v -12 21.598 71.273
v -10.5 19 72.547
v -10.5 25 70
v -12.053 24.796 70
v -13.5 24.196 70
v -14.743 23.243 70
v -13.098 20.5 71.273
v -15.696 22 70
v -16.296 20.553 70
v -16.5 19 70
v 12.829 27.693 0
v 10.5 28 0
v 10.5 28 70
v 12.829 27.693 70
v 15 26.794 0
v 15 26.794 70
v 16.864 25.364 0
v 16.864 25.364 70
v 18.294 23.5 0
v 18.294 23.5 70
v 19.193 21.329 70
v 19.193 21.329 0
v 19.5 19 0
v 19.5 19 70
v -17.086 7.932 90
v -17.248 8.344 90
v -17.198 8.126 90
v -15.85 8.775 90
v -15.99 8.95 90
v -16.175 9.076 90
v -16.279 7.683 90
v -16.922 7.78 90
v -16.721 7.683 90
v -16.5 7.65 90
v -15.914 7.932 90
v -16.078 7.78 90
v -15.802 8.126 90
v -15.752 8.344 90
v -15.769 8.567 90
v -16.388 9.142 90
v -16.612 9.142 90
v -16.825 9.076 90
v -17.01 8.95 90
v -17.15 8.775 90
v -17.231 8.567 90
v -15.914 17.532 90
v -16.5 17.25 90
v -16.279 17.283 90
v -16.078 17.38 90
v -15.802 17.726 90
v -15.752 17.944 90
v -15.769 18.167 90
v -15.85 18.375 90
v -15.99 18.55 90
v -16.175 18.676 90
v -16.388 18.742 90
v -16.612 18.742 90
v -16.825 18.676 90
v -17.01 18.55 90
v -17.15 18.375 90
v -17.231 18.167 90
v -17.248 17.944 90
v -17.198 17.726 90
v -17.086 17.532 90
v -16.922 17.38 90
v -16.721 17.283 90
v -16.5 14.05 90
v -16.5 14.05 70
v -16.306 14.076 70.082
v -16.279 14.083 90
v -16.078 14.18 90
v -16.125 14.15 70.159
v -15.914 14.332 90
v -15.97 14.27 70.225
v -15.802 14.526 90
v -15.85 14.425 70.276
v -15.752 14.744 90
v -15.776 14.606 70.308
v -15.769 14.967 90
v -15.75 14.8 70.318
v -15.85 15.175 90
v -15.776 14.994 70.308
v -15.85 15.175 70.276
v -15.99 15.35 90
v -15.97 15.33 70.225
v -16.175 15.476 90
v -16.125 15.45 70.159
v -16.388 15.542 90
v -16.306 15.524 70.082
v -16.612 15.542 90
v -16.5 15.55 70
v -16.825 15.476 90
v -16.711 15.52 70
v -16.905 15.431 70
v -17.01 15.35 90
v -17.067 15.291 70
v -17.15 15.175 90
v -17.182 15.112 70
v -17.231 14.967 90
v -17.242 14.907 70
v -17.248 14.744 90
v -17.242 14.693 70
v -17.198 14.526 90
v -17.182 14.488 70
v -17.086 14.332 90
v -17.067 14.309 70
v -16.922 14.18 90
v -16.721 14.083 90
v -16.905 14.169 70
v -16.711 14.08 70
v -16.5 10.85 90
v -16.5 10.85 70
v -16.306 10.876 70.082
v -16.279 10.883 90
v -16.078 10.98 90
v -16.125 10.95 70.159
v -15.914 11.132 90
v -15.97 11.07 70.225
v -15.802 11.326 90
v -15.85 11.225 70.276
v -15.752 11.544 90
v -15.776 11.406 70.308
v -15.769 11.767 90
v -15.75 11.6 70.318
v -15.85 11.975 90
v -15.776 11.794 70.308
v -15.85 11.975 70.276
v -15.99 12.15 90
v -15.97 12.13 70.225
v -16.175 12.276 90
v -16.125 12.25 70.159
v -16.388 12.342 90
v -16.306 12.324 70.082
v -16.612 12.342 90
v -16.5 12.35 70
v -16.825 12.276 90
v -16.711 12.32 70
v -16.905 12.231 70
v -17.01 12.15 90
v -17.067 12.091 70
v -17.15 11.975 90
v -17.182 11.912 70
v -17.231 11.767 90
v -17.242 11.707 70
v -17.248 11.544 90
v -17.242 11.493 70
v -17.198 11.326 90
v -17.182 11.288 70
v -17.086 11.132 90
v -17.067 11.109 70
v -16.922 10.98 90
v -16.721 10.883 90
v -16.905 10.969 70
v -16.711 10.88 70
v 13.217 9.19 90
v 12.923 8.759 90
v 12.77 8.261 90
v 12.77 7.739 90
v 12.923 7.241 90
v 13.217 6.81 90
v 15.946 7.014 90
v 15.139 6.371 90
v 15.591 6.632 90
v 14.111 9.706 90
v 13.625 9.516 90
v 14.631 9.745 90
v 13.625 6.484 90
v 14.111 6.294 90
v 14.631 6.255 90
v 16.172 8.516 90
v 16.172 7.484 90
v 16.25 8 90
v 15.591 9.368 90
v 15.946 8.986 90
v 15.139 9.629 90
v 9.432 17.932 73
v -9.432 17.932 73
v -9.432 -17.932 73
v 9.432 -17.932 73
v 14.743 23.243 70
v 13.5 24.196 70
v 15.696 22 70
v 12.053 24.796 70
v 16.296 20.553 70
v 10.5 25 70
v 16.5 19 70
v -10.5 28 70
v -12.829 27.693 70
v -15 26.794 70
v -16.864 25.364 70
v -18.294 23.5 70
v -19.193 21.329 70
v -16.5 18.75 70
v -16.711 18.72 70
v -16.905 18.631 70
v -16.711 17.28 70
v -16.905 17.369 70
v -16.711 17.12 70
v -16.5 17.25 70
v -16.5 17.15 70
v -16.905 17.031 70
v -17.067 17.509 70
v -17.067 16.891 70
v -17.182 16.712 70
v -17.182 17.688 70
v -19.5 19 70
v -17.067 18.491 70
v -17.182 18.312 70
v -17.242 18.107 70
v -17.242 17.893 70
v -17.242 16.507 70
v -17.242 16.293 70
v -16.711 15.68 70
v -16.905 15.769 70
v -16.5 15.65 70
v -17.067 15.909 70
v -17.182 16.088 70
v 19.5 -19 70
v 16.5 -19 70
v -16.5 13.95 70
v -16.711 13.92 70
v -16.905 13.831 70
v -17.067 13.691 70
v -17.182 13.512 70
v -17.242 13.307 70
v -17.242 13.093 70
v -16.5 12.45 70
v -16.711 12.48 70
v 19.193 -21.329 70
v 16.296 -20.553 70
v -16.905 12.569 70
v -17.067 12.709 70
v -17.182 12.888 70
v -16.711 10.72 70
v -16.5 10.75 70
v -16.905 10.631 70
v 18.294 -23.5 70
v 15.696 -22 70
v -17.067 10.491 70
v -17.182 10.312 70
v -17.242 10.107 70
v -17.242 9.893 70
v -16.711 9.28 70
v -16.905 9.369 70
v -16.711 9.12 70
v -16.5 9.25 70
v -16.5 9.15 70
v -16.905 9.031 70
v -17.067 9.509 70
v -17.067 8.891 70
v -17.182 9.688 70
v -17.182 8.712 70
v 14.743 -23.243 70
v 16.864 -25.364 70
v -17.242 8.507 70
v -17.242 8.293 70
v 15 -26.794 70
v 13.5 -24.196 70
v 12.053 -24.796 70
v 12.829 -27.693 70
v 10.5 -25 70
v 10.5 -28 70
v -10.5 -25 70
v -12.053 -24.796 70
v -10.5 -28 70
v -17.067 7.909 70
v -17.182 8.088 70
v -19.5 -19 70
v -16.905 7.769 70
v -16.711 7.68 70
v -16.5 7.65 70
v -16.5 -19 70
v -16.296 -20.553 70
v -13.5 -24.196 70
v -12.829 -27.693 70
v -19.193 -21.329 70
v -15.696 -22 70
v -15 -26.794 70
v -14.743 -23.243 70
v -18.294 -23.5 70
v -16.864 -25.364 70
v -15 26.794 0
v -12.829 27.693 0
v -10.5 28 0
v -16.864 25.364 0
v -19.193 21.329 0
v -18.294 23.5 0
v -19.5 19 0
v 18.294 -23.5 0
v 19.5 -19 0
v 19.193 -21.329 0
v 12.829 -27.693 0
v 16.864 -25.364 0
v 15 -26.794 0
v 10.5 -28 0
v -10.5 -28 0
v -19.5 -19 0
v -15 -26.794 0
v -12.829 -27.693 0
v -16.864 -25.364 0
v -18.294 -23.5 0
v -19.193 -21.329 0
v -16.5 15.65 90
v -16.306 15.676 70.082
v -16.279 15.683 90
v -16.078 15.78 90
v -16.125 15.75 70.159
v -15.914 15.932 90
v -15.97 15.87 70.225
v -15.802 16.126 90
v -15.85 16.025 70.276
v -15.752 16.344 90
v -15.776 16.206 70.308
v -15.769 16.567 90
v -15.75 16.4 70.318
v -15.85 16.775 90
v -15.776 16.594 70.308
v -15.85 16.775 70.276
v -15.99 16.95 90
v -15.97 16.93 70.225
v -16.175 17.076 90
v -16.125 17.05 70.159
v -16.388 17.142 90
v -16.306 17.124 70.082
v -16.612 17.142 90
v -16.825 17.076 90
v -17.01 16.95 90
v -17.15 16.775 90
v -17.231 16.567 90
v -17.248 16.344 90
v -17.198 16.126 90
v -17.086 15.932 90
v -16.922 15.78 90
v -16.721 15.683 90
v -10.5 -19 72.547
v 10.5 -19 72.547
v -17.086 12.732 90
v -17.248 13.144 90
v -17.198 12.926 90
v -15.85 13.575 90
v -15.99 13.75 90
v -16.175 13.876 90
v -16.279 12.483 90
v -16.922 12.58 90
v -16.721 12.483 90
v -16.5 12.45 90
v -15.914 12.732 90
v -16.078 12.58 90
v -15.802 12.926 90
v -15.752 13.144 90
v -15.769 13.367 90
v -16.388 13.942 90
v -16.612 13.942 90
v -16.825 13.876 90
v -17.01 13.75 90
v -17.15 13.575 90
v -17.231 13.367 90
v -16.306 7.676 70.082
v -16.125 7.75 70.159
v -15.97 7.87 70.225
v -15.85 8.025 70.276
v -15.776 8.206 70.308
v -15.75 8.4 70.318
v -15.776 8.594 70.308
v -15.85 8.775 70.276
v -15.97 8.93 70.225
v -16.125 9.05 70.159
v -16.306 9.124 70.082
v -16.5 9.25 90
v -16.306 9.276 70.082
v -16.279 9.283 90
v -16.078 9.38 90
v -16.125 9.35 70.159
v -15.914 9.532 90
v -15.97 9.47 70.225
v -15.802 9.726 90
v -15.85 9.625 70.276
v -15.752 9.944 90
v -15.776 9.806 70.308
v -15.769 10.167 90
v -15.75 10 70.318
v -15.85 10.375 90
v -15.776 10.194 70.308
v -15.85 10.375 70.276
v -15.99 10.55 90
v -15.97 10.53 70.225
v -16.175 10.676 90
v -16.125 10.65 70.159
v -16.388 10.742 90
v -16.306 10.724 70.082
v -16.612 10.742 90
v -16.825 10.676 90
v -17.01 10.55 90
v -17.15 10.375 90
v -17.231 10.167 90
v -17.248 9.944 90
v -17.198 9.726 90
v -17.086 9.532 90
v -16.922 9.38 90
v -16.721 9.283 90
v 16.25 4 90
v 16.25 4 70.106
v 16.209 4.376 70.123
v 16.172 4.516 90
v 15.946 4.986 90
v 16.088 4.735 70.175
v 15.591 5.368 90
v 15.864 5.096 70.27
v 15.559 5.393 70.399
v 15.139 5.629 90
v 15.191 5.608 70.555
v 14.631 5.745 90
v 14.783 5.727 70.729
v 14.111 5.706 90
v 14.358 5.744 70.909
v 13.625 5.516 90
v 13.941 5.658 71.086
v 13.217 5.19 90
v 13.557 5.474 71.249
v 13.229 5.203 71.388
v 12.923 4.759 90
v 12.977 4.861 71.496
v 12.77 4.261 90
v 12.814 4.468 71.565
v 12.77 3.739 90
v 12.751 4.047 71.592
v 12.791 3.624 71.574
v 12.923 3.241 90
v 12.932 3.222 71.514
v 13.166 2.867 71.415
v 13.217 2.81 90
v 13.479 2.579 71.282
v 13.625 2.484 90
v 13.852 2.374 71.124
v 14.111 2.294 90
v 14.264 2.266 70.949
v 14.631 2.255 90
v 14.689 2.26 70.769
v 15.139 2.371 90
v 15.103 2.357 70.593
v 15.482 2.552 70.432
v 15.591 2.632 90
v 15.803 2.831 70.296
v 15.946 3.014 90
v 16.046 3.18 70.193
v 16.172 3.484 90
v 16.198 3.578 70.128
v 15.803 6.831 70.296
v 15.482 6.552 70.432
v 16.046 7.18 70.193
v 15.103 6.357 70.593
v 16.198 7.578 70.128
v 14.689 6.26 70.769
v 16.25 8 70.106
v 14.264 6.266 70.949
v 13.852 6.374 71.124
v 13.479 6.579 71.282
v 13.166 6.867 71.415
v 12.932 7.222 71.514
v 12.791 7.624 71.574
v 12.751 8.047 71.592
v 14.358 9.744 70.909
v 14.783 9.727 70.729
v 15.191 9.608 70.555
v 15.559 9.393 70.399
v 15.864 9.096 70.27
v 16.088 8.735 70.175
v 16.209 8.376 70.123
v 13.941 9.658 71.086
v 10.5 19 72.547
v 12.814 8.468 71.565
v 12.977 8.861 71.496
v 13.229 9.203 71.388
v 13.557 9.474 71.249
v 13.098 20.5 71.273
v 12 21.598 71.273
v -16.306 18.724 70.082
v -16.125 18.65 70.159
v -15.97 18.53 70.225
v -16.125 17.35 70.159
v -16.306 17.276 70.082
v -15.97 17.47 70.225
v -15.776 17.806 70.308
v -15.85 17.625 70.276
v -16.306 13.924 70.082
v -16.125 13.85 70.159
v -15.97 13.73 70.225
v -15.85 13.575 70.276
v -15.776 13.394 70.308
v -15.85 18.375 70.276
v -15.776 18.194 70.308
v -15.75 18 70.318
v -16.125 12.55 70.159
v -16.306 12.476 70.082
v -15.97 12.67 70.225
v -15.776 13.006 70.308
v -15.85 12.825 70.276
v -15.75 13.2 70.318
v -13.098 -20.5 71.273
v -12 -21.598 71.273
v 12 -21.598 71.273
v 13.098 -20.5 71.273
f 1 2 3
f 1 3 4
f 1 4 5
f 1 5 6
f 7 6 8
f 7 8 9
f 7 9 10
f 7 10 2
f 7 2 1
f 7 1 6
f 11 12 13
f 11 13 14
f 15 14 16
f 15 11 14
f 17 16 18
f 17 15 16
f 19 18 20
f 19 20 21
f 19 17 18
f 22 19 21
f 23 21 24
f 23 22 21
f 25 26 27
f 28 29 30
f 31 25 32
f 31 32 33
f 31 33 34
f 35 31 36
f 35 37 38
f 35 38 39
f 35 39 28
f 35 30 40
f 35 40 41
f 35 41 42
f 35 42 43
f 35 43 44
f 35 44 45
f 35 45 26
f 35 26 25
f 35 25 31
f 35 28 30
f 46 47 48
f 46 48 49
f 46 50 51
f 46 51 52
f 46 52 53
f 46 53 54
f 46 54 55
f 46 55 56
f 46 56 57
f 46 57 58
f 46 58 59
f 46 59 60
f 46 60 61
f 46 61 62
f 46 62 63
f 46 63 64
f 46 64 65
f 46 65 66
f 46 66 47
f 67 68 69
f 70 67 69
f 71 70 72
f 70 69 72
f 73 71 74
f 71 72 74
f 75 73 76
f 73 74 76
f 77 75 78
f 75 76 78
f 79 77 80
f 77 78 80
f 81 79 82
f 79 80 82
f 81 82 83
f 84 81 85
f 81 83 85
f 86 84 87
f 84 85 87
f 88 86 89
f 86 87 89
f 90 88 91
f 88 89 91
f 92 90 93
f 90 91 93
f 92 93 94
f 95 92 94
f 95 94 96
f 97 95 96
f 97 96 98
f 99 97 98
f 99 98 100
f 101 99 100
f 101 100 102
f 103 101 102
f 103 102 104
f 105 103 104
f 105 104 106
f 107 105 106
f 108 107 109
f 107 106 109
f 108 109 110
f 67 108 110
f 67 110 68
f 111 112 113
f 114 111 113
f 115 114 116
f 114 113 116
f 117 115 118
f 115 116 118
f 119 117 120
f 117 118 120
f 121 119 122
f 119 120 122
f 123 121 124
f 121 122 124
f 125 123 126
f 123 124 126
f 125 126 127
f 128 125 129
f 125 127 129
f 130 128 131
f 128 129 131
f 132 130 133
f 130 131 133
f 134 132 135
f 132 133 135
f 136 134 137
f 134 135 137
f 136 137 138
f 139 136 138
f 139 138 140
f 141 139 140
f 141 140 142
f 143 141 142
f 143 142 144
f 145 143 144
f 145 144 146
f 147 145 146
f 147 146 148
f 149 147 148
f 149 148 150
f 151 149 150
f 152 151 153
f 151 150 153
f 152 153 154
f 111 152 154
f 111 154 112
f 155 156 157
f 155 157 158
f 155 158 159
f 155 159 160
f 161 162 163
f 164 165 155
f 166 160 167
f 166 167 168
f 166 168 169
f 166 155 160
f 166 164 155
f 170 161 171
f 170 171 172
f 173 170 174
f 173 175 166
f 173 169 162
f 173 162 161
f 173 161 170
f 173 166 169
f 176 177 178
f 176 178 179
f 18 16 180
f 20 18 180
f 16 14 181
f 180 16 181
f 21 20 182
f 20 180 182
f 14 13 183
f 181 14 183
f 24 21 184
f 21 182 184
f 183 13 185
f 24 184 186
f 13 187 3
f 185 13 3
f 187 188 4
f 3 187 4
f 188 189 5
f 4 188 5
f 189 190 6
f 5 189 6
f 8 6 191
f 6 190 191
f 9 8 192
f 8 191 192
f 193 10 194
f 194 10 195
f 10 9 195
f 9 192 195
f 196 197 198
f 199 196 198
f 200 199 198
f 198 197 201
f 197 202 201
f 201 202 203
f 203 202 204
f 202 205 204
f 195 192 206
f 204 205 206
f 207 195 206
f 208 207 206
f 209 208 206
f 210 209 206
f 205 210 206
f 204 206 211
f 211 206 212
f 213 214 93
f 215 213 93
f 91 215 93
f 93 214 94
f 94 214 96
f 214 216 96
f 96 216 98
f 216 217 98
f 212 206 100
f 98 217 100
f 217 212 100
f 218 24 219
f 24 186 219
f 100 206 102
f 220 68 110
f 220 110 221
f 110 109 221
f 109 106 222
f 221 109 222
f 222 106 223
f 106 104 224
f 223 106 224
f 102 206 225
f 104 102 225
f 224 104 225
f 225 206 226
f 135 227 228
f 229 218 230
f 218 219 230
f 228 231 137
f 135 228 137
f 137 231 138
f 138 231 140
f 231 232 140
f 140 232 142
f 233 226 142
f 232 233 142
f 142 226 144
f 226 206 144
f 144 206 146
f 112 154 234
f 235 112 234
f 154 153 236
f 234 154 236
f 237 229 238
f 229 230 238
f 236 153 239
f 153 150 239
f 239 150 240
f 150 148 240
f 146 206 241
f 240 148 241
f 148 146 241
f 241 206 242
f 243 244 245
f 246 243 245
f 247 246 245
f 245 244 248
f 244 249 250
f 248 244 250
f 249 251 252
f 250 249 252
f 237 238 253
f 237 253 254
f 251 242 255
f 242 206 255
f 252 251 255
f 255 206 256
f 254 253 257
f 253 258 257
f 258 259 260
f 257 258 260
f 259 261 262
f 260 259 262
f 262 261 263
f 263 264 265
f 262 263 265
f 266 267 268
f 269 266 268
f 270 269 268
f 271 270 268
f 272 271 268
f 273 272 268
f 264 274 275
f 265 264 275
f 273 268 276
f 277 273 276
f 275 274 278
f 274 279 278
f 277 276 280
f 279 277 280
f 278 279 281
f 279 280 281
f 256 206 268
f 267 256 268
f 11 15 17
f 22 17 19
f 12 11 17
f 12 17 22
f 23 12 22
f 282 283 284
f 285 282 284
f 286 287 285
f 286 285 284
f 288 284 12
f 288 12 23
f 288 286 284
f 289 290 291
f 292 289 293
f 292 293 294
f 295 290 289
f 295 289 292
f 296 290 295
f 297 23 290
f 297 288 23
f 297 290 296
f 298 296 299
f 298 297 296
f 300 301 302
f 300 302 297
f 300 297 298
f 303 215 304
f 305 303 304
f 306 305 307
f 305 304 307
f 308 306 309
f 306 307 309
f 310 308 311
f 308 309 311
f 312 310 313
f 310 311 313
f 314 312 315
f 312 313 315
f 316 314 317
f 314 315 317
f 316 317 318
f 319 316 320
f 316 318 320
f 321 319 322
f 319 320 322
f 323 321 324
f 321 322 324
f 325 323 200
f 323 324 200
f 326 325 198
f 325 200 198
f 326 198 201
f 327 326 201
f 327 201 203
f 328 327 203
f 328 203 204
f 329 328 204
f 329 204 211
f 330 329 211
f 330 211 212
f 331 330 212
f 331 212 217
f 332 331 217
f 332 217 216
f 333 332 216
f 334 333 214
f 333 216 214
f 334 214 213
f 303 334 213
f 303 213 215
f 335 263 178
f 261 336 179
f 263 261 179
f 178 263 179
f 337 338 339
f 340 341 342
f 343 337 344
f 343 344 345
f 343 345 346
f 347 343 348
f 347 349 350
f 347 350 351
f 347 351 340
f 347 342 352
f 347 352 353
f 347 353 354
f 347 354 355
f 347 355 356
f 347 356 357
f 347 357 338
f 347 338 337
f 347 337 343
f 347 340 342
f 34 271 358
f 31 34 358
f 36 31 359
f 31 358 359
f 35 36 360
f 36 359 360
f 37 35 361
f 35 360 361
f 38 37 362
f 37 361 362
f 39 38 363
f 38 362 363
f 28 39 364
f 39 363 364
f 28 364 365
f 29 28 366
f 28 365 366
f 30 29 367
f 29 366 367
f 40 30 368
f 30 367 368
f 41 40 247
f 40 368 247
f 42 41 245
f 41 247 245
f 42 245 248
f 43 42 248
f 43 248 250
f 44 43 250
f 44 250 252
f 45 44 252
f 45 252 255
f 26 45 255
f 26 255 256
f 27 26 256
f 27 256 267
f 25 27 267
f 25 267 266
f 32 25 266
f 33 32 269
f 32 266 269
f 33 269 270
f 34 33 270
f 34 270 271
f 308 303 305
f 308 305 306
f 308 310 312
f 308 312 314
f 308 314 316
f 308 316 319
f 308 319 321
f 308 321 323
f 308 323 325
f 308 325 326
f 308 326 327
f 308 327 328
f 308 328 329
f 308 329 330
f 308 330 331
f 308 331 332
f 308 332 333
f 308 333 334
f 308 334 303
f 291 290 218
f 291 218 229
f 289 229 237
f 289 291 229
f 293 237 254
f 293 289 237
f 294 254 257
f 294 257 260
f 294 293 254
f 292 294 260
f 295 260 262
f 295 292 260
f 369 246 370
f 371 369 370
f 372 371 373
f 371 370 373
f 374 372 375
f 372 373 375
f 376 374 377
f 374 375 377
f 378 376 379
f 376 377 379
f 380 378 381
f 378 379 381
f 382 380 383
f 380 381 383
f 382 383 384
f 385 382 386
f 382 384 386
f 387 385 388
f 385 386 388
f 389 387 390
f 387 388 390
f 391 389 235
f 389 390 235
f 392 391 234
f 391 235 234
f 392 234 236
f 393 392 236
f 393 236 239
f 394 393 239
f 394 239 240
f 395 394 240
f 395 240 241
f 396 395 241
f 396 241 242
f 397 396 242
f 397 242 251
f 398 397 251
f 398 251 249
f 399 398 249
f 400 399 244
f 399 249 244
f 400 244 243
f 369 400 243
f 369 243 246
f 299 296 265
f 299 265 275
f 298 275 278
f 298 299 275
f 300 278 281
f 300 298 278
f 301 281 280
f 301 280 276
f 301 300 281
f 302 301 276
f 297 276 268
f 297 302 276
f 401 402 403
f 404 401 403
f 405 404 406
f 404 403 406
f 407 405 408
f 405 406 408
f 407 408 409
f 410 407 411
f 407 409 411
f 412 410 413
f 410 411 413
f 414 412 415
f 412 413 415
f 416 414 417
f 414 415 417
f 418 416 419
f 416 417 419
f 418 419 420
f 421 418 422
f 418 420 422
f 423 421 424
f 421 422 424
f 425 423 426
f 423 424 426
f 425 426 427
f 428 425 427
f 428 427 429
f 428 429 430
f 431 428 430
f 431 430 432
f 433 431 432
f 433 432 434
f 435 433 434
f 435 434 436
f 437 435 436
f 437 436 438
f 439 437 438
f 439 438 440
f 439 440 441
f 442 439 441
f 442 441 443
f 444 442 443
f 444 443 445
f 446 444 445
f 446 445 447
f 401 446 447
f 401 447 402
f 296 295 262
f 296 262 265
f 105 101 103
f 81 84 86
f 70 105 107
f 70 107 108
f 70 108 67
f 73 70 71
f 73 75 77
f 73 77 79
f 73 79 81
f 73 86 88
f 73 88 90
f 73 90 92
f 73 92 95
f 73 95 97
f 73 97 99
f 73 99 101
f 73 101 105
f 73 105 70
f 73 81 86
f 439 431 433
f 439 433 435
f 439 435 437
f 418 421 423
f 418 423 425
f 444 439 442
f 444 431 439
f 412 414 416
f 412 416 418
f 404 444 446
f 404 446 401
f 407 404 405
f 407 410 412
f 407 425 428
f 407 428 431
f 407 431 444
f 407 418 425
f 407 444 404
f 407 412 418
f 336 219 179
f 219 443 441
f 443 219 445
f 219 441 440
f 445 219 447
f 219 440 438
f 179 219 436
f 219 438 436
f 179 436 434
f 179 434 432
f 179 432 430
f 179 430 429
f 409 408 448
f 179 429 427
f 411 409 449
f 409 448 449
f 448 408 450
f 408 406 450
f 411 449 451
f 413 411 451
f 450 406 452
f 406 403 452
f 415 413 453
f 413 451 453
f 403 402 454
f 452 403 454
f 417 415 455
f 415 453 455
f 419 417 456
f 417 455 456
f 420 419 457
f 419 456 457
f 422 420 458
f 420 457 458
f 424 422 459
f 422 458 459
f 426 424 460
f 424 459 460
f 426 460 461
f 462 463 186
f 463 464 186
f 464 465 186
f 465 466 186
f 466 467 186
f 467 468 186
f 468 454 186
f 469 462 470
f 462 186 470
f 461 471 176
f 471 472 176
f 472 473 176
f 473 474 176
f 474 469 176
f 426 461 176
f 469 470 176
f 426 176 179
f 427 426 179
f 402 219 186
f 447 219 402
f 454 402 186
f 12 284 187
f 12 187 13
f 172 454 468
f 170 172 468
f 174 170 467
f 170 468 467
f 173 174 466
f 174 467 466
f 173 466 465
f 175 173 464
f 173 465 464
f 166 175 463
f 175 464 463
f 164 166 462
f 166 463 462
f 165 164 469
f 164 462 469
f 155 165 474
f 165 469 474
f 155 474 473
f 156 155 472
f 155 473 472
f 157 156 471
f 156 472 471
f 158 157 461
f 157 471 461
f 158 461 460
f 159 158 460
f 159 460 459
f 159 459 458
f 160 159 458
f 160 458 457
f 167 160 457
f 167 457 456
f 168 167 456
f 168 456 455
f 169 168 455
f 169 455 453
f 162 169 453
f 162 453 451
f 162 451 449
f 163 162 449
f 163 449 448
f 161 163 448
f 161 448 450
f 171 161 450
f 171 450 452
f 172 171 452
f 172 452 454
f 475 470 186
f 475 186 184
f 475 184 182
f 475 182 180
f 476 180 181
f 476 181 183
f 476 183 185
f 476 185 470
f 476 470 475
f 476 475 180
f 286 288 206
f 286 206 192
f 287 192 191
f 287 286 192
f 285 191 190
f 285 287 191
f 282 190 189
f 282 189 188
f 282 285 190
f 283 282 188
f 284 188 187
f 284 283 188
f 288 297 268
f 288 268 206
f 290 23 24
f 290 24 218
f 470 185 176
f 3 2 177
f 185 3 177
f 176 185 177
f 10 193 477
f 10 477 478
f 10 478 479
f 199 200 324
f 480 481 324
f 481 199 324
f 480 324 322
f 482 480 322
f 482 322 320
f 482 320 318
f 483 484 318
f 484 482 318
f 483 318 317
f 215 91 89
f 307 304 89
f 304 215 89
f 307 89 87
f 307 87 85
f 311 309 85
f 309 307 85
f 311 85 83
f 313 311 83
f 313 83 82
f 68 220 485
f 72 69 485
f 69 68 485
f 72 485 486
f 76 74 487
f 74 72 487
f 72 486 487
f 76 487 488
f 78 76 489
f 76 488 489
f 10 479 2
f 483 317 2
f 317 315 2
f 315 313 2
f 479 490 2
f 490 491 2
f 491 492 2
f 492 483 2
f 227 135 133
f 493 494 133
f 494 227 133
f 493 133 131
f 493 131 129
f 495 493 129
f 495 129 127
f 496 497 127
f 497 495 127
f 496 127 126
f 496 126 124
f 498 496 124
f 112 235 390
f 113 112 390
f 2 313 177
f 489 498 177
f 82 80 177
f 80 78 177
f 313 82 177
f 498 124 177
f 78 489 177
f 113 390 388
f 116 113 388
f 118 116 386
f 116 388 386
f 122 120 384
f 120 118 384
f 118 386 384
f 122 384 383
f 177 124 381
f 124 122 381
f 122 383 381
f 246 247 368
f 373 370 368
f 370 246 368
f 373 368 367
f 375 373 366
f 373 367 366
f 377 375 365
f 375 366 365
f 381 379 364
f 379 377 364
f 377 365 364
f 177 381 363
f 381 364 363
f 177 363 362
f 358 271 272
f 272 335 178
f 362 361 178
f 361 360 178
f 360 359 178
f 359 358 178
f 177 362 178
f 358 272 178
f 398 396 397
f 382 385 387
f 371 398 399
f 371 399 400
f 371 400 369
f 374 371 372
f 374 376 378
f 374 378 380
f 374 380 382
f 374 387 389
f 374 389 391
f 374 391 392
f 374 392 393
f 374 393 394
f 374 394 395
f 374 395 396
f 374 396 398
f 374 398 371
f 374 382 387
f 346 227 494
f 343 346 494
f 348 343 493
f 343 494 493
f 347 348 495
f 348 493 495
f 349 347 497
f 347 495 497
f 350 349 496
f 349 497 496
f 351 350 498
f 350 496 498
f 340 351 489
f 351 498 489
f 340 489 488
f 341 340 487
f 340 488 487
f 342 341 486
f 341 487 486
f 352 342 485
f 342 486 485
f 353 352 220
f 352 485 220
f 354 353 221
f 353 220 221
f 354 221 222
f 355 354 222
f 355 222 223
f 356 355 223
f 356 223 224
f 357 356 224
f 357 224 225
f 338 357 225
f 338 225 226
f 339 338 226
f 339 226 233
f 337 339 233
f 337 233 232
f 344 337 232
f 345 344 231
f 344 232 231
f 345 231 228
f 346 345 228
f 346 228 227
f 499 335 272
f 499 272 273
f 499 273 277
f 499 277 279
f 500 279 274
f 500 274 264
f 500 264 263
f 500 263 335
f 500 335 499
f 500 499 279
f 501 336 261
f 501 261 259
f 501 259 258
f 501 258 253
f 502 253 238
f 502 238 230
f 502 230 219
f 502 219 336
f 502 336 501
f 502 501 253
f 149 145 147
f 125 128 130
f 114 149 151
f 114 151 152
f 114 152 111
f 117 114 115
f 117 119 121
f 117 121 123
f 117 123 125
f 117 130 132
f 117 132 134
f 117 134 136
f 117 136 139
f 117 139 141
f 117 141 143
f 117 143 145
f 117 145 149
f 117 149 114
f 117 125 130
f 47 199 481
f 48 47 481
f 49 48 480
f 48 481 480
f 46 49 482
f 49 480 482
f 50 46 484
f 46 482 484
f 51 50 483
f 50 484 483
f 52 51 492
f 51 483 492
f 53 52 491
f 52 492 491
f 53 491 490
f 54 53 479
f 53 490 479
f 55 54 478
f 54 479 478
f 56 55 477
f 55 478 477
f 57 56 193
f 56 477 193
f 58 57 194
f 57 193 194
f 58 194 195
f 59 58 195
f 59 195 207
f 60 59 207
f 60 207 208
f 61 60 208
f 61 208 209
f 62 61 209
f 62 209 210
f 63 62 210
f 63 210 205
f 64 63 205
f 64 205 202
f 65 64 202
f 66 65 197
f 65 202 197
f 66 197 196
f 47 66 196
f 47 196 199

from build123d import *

# Parameters (mm, degrees)
BOSS_EXTRUDE1_DEPTH = 70
BOSS_EXTRUDE2_DEPTH = 3
BOSS_EXTRUDE2_TAPER = 67
SKETCH3_R           = 1.75
SKETCH3_R_2         = 0.75
BOSS_EXTRUDE3_DEPTH = 20


with BuildPart() as part:
    # Sketch1 → Boss-Extrude1 (new body)
    with BuildSketch(Plane(origin=(0, 0, 0), x_dir=(0, 1, 0), z_dir=(0, 0, 1))):
        with BuildLine():
            Line((-19, 19.5), (19, 19.5))
            ThreePointArc((19, 19.5), (25.363961031, 16.863961031), (28, 10.5))
            Line((28, 10.5), (28, -10.5))
            ThreePointArc((28, -10.5), (25.363961031, -16.863961031), (19, -19.5))
            Line((19, -19.5), (-19, -19.5))
            ThreePointArc((-19, -19.5), (-25.363961031, -16.863961031), (-28, -10.5))
            Line((-28, -10.5), (-28, 10.5))
            ThreePointArc((-28, 10.5), (-25.363961031, 16.863961031), (-19, 19.5))
        make_face()
    extrude(amount=BOSS_EXTRUDE1_DEPTH)

    # Sketch2 → Boss-Extrude2 (add)
    with BuildSketch(Plane.XY.offset(70)):
        with BuildLine():
            Line((10.5, 25), (-10.5, 25))
            ThreePointArc((-10.5, 25), (-14.742640687, 23.242640687), (-16.5, 19))
            Line((-16.5, 19), (-16.5, -19))
            ThreePointArc((-16.5, -19), (-14.742640687, -23.242640687), (-10.5, -25))
            Line((-10.5, -25), (10.5, -25))
            ThreePointArc((10.5, -25), (14.742640687, -23.242640687), (16.5, -19))
            Line((16.5, -19), (16.5, 19))
            ThreePointArc((16.5, 19), (14.742640687, 23.242640687), (10.5, 25))
        make_face()
    extrude(amount=BOSS_EXTRUDE2_DEPTH, taper=BOSS_EXTRUDE2_TAPER)

    # Sketch3 → Boss-Extrude3 (add)
    with BuildSketch(Plane.XY.offset(70)):
        with Locations((14.5, 8)):
            Circle(SKETCH3_R)
        with Locations((14.5, 4)):
            Circle(SKETCH3_R)
        with Locations(Location((-16.5, 18, 0), (0, 0, 270))):
            Circle(SKETCH3_R_2)
        with Locations(Location((-16.5, 16.4, 0), (0, 0, 270))):
            Circle(SKETCH3_R_2)
        with Locations(Location((-16.5, 14.8, 0), (0, 0, 270))):
            Circle(SKETCH3_R_2)
        with Locations(Location((-16.5, 13.2, 0), (0, 0, 270))):
            Circle(SKETCH3_R_2)
        with Locations(Location((-16.5, 11.6, 0), (0, 0, 270))):
            Circle(SKETCH3_R_2)
        with Locations(Location((-16.5, 10, 0), (0, 0, 270))):
            Circle(SKETCH3_R_2)
        with Locations(Location((-16.5, 8.4, 0), (0, 0, 270))):
            Circle(SKETCH3_R_2)
    extrude(amount=BOSS_EXTRUDE3_DEPTH)


solid = part.part
